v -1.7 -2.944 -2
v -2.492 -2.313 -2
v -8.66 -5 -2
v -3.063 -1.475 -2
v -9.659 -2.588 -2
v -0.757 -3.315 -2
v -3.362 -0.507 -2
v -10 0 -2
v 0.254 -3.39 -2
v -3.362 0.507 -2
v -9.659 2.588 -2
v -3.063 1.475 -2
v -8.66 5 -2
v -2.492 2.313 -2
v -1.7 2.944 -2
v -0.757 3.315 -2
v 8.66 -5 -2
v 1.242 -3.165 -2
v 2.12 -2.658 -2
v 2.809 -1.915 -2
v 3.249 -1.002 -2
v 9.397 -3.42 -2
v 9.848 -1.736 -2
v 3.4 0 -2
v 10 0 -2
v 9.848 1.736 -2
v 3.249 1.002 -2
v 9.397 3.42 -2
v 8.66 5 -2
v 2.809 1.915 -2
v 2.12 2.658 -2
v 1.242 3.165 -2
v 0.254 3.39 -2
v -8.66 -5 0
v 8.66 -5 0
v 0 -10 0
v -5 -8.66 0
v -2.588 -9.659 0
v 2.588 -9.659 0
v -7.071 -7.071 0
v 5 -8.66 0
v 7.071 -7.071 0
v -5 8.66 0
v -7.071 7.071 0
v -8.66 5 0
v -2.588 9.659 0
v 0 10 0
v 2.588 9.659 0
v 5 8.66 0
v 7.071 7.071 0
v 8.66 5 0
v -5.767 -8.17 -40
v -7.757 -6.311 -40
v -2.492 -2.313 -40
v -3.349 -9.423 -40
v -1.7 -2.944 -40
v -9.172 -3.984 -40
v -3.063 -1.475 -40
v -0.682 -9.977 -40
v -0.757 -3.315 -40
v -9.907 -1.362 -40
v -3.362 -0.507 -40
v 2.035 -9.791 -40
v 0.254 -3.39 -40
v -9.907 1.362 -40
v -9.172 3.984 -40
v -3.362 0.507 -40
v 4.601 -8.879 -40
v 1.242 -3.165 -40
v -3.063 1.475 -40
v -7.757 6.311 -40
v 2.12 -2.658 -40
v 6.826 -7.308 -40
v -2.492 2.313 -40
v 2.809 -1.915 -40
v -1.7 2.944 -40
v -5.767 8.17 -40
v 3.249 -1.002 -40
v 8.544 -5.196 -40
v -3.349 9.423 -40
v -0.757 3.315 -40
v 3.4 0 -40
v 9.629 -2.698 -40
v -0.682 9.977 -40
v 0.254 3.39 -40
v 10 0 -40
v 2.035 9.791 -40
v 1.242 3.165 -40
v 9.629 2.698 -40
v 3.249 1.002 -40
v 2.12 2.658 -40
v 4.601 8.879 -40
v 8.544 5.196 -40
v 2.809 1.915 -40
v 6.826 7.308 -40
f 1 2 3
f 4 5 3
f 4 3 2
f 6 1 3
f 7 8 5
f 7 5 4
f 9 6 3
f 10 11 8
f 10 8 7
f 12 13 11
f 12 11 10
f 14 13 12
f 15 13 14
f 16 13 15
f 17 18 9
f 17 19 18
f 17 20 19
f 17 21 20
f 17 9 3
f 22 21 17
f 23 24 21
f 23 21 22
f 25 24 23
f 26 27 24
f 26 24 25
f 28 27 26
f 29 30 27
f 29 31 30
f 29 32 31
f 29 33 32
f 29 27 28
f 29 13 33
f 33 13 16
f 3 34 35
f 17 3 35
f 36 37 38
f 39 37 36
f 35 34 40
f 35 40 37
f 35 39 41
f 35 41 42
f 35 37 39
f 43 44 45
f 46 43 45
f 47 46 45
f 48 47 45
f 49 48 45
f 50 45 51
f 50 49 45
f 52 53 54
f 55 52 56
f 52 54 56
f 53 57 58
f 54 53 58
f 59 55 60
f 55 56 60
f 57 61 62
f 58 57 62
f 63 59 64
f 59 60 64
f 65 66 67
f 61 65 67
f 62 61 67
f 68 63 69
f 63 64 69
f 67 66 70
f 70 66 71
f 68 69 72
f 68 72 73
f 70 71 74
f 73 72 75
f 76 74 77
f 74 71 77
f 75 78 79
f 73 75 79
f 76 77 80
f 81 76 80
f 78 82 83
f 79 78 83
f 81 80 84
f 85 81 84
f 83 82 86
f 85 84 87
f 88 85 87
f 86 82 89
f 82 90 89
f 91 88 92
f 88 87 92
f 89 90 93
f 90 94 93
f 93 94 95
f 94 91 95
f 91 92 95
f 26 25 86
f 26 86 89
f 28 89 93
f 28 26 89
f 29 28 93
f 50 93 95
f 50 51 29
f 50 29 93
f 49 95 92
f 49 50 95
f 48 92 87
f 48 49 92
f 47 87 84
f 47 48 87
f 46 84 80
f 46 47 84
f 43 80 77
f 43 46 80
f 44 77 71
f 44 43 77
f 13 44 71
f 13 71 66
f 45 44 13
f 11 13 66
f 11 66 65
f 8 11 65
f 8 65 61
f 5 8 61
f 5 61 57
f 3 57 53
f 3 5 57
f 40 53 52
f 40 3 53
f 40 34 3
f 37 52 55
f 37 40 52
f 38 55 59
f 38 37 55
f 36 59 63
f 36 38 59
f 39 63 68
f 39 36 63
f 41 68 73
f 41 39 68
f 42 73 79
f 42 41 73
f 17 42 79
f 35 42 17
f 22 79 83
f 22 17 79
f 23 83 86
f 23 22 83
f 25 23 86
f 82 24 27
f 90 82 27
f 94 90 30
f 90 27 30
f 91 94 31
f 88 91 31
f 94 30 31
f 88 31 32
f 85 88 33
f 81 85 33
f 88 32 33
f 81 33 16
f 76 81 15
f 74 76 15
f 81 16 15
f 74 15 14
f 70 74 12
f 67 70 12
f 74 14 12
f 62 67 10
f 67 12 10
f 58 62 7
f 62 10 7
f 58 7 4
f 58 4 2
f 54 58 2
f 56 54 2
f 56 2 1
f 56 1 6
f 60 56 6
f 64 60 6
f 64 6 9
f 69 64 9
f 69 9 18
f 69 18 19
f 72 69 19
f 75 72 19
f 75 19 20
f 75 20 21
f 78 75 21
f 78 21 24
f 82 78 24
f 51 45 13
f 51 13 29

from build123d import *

# Parameters (mm, degrees)
F0_R     = 10
F1_DEPTH = 40
F2_R     = 3.4
F3_DEPTH = 40.001
F4_W     = 25.61774
F4_H     = 10
F5_DEPTH = 2


with BuildPart() as f1:
    # F0 (on Top) → F1 (new body)
    with BuildSketch(Plane.XY):
        Circle(F0_R)
    extrude(amount=-F1_DEPTH)

    # F2 (on face) → F3 (cut, through all)
    with BuildSketch(Plane.XY):
        Circle(F2_R)
    extrude(amount=-F3_DEPTH, mode=Mode.SUBTRACT)

    # F4 (on face) → F5 (cut)
    with BuildSketch(Plane.XY):
        Rectangle(F4_W, F4_H)
    extrude(amount=-F5_DEPTH, mode=Mode.SUBTRACT)


solid = f1.part
